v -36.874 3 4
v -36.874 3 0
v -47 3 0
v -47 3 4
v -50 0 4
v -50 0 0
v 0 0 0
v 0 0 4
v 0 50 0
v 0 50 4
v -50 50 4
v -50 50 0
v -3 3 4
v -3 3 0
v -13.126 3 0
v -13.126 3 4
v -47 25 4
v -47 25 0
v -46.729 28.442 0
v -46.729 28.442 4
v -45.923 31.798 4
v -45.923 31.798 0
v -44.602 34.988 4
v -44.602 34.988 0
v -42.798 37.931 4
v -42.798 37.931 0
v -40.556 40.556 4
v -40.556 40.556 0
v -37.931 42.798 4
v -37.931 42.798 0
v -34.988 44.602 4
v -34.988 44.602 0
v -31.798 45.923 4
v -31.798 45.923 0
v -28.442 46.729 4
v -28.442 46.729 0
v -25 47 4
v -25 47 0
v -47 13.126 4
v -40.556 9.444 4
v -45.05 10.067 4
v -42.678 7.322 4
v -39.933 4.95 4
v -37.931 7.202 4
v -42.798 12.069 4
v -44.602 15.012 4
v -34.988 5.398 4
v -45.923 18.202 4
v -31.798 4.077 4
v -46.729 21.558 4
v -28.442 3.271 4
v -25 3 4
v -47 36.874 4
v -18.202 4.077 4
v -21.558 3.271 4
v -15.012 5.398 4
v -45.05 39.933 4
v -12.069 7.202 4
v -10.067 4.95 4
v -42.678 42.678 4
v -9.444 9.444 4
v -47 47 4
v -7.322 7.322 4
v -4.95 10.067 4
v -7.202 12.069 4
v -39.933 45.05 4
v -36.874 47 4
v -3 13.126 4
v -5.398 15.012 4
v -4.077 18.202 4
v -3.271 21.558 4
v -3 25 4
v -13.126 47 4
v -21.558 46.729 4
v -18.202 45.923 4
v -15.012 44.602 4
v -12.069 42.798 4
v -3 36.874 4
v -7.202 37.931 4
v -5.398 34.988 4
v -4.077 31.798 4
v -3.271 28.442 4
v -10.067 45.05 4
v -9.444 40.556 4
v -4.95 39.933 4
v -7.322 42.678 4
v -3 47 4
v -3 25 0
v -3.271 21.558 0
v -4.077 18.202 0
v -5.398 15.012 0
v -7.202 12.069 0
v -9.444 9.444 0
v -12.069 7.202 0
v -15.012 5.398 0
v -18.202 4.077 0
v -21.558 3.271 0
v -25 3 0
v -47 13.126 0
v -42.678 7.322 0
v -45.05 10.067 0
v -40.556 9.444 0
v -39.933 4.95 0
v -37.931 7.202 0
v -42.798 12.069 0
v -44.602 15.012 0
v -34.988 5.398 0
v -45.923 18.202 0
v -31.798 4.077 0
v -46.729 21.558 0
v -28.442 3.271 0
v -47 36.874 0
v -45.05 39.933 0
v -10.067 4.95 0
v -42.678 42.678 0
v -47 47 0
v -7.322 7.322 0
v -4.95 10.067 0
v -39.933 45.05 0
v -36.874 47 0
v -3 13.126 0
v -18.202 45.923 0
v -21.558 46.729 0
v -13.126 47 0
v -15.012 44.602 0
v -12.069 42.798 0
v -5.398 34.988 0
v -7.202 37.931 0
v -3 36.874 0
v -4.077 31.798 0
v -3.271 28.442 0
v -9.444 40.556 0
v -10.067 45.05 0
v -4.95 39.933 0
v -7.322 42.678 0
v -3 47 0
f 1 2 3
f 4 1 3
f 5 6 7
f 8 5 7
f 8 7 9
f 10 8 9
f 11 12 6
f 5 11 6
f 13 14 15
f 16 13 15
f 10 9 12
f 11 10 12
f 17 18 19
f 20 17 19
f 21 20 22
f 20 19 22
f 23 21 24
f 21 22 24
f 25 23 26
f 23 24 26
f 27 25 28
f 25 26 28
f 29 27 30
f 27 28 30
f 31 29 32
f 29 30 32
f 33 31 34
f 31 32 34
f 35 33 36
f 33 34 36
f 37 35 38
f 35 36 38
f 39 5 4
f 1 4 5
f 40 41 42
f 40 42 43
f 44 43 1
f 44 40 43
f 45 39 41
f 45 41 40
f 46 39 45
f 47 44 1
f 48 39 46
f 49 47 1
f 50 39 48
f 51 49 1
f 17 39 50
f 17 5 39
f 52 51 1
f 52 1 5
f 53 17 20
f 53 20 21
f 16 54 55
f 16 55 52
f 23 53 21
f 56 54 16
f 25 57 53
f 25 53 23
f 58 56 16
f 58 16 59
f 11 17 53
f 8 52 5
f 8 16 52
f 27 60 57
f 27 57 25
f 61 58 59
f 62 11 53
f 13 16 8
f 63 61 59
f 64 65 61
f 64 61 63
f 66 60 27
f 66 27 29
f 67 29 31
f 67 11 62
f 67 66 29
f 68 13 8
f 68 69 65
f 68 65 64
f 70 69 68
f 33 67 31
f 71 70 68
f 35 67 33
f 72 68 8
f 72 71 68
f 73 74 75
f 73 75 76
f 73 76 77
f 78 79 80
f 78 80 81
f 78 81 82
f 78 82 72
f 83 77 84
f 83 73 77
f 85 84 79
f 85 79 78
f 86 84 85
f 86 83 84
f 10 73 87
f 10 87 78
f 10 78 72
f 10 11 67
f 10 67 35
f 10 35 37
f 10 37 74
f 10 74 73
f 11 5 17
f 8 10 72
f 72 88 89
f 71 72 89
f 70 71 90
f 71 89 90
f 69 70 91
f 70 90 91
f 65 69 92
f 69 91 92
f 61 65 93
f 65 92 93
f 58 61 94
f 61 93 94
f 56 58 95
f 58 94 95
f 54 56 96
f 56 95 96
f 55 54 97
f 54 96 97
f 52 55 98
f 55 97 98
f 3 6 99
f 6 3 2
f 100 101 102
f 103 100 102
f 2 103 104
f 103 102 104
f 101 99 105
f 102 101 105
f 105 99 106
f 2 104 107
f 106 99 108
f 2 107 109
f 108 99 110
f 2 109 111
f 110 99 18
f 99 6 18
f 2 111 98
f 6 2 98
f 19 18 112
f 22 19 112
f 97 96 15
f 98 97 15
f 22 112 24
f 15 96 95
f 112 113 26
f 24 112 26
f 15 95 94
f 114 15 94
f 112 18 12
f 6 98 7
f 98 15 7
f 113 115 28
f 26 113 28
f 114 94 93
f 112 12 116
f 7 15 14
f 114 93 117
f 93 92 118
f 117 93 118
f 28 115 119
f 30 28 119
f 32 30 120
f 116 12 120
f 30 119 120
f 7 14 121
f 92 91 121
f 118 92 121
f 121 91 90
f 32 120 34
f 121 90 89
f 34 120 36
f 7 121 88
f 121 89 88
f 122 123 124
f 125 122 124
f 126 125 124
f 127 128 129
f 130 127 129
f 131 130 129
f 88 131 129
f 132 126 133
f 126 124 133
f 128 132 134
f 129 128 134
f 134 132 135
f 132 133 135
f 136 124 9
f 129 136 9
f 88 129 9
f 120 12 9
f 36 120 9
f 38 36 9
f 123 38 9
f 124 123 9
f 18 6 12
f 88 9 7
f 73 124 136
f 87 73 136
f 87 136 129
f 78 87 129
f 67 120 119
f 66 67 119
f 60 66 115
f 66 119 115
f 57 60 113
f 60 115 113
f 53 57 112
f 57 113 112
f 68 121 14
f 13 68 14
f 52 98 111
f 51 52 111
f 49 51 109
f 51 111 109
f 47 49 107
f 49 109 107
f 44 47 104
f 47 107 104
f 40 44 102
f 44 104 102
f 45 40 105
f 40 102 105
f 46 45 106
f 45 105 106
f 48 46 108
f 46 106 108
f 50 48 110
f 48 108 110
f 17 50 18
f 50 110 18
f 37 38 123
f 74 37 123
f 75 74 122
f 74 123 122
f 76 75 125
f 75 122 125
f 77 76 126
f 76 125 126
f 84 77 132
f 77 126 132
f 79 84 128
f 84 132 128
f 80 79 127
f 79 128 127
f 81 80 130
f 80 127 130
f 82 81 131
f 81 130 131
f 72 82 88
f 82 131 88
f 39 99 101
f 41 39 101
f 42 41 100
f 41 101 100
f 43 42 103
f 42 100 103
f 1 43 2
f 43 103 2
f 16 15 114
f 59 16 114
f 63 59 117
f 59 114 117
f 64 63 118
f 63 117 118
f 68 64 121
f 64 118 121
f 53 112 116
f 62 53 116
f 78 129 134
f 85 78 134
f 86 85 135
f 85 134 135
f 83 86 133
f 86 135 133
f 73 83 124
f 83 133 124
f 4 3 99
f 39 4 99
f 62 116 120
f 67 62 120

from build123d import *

# Parameters (mm, degrees)
F1_DEPTH = 4


with BuildPart() as f1:
    # F0 (on Top) → F1 (new body)
    with BuildSketch(Plane.XY):
        with BuildLine():
            Line((-50, 50), (-50, 25))
            ThreePointArc((-50, 25), (-49.2383992871, 31.123724357), (-47, 36.874342087))
            Line((-47, 36.874342087), (-47, 47))
            Line((-47, 47), (-36.874342087, 47))
            ThreePointArc((-36.874342087, 47), (-31.123724357, 49.2383992871), (-25, 50))
            Line((-25, 50), (-50, 50))
        make_face()
        with BuildLine():
            ThreePointArc((-47, 36.874342087), (-49.2383992871, 31.123724357), (-50, 25))
            ThreePointArc((-50, 25), (-49.2383992871, 18.876275643), (-47, 13.125657913))
            Line((-47, 13.125657913), (-47, 25))
            Line((-47, 25), (-47, 36.874342087))
        make_face()
        with BuildLine():
            Line((-50, 0), (-25, 0))
            ThreePointArc((-25, 0), (-31.123724357, 0.7616007129), (-36.874342087, 3))
            Line((-36.874342087, 3), (-47, 3))
            Line((-47, 3), (-47, 13.125657913))
            ThreePointArc((-47, 13.125657913), (-49.2383992871, 18.876275643), (-50, 25))
            Line((-50, 25), (-50, 0))
        make_face()
        with BuildLine():
            ThreePointArc((-36.874342087, 3), (-31.123724357, 0.7616007129), (-25, 0))
            ThreePointArc((-25, 0), (-18.876275643, 0.7616007129), (-13.125657913, 3))
            Line((-13.125657913, 3), (-25, 3))
            Line((-25, 3), (-36.874342087, 3))
        make_face()
        with BuildLine():
            Line((-25, 0), (0, 0))
            Line((0, 0), (0, 25))
            ThreePointArc((0, 25), (-0.7616007129, 18.876275643), (-3, 13.125657913))
            Line((-3, 13.125657913), (-3, 3))
            Line((-3, 3), (-13.125657913, 3))
            ThreePointArc((-13.125657913, 3), (-18.876275643, 0.7616007129), (-25, 0))
        make_face()
        with BuildLine():
            ThreePointArc((-3, 13.125657913), (-0.7616007129, 18.876275643), (0, 25))
            ThreePointArc((0, 25), (-0.7616007129, 31.123724357), (-3, 36.874342087))
            Line((-3, 36.874342087), (-3, 25))
            Line((-3, 25), (-3, 13.125657913))
        make_face()
        with BuildLine():
            ThreePointArc((-3, 36.874342087), (-0.7616007129, 31.123724357), (0, 25))
            Line((0, 25), (0, 50))
            Line((0, 50), (-25, 50))
            ThreePointArc((-25, 50), (-18.876275643, 49.2383992871), (-13.125657913, 47))
            Line((-13.125657913, 47), (-3, 47))
            Line((-3, 47), (-3, 36.874342087))
        make_face()
        with BuildLine():
            ThreePointArc((-13.125657913, 47), (-18.876275643, 49.2383992871), (-25, 50))
            ThreePointArc((-25, 50), (-31.123724357, 49.2383992871), (-36.874342087, 47))
            Line((-36.874342087, 47), (-25, 47))
            Line((-25, 47), (-13.125657913, 47))
        make_face()
        with BuildLine():
            ThreePointArc((-36.874342087, 47), (-42.6776695297, 42.6776695297), (-47, 36.874342087))
            Line((-47, 36.874342087), (-47, 25))
            ThreePointArc((-47, 25), (-40.5563491861, 40.5563491861), (-25, 47))
            Line((-25, 47), (-36.874342087, 47))
        make_face()
        with BuildLine():
            ThreePointArc((-47, 13.125657913), (-42.6776695297, 7.3223304703), (-36.874342087, 3))
            Line((-36.874342087, 3), (-25, 3))
            ThreePointArc((-25, 3), (-40.5563491861, 9.4436508139), (-47, 25))
            Line((-47, 25), (-47, 13.125657913))
        make_face()
        with BuildLine():
            Line((-25, 3), (-13.125657913, 3))
            ThreePointArc((-13.125657913, 3), (-7.3223304703, 7.3223304703), (-3, 13.125657913))
            Line((-3, 13.125657913), (-3, 25))
            ThreePointArc((-3, 25), (-9.4436508139, 9.4436508139), (-25, 3))
        make_face()
        with BuildLine():
            Line((-3, 25), (-3, 36.874342087))
            ThreePointArc((-3, 36.874342087), (-7.3223304703, 42.6776695297), (-13.125657913, 47))
            Line((-13.125657913, 47), (-25, 47))
            ThreePointArc((-25, 47), (-9.4436508139, 40.5563491861), (-3, 25))
        make_face()
    extrude(amount=F1_DEPTH)


solid = f1.part
